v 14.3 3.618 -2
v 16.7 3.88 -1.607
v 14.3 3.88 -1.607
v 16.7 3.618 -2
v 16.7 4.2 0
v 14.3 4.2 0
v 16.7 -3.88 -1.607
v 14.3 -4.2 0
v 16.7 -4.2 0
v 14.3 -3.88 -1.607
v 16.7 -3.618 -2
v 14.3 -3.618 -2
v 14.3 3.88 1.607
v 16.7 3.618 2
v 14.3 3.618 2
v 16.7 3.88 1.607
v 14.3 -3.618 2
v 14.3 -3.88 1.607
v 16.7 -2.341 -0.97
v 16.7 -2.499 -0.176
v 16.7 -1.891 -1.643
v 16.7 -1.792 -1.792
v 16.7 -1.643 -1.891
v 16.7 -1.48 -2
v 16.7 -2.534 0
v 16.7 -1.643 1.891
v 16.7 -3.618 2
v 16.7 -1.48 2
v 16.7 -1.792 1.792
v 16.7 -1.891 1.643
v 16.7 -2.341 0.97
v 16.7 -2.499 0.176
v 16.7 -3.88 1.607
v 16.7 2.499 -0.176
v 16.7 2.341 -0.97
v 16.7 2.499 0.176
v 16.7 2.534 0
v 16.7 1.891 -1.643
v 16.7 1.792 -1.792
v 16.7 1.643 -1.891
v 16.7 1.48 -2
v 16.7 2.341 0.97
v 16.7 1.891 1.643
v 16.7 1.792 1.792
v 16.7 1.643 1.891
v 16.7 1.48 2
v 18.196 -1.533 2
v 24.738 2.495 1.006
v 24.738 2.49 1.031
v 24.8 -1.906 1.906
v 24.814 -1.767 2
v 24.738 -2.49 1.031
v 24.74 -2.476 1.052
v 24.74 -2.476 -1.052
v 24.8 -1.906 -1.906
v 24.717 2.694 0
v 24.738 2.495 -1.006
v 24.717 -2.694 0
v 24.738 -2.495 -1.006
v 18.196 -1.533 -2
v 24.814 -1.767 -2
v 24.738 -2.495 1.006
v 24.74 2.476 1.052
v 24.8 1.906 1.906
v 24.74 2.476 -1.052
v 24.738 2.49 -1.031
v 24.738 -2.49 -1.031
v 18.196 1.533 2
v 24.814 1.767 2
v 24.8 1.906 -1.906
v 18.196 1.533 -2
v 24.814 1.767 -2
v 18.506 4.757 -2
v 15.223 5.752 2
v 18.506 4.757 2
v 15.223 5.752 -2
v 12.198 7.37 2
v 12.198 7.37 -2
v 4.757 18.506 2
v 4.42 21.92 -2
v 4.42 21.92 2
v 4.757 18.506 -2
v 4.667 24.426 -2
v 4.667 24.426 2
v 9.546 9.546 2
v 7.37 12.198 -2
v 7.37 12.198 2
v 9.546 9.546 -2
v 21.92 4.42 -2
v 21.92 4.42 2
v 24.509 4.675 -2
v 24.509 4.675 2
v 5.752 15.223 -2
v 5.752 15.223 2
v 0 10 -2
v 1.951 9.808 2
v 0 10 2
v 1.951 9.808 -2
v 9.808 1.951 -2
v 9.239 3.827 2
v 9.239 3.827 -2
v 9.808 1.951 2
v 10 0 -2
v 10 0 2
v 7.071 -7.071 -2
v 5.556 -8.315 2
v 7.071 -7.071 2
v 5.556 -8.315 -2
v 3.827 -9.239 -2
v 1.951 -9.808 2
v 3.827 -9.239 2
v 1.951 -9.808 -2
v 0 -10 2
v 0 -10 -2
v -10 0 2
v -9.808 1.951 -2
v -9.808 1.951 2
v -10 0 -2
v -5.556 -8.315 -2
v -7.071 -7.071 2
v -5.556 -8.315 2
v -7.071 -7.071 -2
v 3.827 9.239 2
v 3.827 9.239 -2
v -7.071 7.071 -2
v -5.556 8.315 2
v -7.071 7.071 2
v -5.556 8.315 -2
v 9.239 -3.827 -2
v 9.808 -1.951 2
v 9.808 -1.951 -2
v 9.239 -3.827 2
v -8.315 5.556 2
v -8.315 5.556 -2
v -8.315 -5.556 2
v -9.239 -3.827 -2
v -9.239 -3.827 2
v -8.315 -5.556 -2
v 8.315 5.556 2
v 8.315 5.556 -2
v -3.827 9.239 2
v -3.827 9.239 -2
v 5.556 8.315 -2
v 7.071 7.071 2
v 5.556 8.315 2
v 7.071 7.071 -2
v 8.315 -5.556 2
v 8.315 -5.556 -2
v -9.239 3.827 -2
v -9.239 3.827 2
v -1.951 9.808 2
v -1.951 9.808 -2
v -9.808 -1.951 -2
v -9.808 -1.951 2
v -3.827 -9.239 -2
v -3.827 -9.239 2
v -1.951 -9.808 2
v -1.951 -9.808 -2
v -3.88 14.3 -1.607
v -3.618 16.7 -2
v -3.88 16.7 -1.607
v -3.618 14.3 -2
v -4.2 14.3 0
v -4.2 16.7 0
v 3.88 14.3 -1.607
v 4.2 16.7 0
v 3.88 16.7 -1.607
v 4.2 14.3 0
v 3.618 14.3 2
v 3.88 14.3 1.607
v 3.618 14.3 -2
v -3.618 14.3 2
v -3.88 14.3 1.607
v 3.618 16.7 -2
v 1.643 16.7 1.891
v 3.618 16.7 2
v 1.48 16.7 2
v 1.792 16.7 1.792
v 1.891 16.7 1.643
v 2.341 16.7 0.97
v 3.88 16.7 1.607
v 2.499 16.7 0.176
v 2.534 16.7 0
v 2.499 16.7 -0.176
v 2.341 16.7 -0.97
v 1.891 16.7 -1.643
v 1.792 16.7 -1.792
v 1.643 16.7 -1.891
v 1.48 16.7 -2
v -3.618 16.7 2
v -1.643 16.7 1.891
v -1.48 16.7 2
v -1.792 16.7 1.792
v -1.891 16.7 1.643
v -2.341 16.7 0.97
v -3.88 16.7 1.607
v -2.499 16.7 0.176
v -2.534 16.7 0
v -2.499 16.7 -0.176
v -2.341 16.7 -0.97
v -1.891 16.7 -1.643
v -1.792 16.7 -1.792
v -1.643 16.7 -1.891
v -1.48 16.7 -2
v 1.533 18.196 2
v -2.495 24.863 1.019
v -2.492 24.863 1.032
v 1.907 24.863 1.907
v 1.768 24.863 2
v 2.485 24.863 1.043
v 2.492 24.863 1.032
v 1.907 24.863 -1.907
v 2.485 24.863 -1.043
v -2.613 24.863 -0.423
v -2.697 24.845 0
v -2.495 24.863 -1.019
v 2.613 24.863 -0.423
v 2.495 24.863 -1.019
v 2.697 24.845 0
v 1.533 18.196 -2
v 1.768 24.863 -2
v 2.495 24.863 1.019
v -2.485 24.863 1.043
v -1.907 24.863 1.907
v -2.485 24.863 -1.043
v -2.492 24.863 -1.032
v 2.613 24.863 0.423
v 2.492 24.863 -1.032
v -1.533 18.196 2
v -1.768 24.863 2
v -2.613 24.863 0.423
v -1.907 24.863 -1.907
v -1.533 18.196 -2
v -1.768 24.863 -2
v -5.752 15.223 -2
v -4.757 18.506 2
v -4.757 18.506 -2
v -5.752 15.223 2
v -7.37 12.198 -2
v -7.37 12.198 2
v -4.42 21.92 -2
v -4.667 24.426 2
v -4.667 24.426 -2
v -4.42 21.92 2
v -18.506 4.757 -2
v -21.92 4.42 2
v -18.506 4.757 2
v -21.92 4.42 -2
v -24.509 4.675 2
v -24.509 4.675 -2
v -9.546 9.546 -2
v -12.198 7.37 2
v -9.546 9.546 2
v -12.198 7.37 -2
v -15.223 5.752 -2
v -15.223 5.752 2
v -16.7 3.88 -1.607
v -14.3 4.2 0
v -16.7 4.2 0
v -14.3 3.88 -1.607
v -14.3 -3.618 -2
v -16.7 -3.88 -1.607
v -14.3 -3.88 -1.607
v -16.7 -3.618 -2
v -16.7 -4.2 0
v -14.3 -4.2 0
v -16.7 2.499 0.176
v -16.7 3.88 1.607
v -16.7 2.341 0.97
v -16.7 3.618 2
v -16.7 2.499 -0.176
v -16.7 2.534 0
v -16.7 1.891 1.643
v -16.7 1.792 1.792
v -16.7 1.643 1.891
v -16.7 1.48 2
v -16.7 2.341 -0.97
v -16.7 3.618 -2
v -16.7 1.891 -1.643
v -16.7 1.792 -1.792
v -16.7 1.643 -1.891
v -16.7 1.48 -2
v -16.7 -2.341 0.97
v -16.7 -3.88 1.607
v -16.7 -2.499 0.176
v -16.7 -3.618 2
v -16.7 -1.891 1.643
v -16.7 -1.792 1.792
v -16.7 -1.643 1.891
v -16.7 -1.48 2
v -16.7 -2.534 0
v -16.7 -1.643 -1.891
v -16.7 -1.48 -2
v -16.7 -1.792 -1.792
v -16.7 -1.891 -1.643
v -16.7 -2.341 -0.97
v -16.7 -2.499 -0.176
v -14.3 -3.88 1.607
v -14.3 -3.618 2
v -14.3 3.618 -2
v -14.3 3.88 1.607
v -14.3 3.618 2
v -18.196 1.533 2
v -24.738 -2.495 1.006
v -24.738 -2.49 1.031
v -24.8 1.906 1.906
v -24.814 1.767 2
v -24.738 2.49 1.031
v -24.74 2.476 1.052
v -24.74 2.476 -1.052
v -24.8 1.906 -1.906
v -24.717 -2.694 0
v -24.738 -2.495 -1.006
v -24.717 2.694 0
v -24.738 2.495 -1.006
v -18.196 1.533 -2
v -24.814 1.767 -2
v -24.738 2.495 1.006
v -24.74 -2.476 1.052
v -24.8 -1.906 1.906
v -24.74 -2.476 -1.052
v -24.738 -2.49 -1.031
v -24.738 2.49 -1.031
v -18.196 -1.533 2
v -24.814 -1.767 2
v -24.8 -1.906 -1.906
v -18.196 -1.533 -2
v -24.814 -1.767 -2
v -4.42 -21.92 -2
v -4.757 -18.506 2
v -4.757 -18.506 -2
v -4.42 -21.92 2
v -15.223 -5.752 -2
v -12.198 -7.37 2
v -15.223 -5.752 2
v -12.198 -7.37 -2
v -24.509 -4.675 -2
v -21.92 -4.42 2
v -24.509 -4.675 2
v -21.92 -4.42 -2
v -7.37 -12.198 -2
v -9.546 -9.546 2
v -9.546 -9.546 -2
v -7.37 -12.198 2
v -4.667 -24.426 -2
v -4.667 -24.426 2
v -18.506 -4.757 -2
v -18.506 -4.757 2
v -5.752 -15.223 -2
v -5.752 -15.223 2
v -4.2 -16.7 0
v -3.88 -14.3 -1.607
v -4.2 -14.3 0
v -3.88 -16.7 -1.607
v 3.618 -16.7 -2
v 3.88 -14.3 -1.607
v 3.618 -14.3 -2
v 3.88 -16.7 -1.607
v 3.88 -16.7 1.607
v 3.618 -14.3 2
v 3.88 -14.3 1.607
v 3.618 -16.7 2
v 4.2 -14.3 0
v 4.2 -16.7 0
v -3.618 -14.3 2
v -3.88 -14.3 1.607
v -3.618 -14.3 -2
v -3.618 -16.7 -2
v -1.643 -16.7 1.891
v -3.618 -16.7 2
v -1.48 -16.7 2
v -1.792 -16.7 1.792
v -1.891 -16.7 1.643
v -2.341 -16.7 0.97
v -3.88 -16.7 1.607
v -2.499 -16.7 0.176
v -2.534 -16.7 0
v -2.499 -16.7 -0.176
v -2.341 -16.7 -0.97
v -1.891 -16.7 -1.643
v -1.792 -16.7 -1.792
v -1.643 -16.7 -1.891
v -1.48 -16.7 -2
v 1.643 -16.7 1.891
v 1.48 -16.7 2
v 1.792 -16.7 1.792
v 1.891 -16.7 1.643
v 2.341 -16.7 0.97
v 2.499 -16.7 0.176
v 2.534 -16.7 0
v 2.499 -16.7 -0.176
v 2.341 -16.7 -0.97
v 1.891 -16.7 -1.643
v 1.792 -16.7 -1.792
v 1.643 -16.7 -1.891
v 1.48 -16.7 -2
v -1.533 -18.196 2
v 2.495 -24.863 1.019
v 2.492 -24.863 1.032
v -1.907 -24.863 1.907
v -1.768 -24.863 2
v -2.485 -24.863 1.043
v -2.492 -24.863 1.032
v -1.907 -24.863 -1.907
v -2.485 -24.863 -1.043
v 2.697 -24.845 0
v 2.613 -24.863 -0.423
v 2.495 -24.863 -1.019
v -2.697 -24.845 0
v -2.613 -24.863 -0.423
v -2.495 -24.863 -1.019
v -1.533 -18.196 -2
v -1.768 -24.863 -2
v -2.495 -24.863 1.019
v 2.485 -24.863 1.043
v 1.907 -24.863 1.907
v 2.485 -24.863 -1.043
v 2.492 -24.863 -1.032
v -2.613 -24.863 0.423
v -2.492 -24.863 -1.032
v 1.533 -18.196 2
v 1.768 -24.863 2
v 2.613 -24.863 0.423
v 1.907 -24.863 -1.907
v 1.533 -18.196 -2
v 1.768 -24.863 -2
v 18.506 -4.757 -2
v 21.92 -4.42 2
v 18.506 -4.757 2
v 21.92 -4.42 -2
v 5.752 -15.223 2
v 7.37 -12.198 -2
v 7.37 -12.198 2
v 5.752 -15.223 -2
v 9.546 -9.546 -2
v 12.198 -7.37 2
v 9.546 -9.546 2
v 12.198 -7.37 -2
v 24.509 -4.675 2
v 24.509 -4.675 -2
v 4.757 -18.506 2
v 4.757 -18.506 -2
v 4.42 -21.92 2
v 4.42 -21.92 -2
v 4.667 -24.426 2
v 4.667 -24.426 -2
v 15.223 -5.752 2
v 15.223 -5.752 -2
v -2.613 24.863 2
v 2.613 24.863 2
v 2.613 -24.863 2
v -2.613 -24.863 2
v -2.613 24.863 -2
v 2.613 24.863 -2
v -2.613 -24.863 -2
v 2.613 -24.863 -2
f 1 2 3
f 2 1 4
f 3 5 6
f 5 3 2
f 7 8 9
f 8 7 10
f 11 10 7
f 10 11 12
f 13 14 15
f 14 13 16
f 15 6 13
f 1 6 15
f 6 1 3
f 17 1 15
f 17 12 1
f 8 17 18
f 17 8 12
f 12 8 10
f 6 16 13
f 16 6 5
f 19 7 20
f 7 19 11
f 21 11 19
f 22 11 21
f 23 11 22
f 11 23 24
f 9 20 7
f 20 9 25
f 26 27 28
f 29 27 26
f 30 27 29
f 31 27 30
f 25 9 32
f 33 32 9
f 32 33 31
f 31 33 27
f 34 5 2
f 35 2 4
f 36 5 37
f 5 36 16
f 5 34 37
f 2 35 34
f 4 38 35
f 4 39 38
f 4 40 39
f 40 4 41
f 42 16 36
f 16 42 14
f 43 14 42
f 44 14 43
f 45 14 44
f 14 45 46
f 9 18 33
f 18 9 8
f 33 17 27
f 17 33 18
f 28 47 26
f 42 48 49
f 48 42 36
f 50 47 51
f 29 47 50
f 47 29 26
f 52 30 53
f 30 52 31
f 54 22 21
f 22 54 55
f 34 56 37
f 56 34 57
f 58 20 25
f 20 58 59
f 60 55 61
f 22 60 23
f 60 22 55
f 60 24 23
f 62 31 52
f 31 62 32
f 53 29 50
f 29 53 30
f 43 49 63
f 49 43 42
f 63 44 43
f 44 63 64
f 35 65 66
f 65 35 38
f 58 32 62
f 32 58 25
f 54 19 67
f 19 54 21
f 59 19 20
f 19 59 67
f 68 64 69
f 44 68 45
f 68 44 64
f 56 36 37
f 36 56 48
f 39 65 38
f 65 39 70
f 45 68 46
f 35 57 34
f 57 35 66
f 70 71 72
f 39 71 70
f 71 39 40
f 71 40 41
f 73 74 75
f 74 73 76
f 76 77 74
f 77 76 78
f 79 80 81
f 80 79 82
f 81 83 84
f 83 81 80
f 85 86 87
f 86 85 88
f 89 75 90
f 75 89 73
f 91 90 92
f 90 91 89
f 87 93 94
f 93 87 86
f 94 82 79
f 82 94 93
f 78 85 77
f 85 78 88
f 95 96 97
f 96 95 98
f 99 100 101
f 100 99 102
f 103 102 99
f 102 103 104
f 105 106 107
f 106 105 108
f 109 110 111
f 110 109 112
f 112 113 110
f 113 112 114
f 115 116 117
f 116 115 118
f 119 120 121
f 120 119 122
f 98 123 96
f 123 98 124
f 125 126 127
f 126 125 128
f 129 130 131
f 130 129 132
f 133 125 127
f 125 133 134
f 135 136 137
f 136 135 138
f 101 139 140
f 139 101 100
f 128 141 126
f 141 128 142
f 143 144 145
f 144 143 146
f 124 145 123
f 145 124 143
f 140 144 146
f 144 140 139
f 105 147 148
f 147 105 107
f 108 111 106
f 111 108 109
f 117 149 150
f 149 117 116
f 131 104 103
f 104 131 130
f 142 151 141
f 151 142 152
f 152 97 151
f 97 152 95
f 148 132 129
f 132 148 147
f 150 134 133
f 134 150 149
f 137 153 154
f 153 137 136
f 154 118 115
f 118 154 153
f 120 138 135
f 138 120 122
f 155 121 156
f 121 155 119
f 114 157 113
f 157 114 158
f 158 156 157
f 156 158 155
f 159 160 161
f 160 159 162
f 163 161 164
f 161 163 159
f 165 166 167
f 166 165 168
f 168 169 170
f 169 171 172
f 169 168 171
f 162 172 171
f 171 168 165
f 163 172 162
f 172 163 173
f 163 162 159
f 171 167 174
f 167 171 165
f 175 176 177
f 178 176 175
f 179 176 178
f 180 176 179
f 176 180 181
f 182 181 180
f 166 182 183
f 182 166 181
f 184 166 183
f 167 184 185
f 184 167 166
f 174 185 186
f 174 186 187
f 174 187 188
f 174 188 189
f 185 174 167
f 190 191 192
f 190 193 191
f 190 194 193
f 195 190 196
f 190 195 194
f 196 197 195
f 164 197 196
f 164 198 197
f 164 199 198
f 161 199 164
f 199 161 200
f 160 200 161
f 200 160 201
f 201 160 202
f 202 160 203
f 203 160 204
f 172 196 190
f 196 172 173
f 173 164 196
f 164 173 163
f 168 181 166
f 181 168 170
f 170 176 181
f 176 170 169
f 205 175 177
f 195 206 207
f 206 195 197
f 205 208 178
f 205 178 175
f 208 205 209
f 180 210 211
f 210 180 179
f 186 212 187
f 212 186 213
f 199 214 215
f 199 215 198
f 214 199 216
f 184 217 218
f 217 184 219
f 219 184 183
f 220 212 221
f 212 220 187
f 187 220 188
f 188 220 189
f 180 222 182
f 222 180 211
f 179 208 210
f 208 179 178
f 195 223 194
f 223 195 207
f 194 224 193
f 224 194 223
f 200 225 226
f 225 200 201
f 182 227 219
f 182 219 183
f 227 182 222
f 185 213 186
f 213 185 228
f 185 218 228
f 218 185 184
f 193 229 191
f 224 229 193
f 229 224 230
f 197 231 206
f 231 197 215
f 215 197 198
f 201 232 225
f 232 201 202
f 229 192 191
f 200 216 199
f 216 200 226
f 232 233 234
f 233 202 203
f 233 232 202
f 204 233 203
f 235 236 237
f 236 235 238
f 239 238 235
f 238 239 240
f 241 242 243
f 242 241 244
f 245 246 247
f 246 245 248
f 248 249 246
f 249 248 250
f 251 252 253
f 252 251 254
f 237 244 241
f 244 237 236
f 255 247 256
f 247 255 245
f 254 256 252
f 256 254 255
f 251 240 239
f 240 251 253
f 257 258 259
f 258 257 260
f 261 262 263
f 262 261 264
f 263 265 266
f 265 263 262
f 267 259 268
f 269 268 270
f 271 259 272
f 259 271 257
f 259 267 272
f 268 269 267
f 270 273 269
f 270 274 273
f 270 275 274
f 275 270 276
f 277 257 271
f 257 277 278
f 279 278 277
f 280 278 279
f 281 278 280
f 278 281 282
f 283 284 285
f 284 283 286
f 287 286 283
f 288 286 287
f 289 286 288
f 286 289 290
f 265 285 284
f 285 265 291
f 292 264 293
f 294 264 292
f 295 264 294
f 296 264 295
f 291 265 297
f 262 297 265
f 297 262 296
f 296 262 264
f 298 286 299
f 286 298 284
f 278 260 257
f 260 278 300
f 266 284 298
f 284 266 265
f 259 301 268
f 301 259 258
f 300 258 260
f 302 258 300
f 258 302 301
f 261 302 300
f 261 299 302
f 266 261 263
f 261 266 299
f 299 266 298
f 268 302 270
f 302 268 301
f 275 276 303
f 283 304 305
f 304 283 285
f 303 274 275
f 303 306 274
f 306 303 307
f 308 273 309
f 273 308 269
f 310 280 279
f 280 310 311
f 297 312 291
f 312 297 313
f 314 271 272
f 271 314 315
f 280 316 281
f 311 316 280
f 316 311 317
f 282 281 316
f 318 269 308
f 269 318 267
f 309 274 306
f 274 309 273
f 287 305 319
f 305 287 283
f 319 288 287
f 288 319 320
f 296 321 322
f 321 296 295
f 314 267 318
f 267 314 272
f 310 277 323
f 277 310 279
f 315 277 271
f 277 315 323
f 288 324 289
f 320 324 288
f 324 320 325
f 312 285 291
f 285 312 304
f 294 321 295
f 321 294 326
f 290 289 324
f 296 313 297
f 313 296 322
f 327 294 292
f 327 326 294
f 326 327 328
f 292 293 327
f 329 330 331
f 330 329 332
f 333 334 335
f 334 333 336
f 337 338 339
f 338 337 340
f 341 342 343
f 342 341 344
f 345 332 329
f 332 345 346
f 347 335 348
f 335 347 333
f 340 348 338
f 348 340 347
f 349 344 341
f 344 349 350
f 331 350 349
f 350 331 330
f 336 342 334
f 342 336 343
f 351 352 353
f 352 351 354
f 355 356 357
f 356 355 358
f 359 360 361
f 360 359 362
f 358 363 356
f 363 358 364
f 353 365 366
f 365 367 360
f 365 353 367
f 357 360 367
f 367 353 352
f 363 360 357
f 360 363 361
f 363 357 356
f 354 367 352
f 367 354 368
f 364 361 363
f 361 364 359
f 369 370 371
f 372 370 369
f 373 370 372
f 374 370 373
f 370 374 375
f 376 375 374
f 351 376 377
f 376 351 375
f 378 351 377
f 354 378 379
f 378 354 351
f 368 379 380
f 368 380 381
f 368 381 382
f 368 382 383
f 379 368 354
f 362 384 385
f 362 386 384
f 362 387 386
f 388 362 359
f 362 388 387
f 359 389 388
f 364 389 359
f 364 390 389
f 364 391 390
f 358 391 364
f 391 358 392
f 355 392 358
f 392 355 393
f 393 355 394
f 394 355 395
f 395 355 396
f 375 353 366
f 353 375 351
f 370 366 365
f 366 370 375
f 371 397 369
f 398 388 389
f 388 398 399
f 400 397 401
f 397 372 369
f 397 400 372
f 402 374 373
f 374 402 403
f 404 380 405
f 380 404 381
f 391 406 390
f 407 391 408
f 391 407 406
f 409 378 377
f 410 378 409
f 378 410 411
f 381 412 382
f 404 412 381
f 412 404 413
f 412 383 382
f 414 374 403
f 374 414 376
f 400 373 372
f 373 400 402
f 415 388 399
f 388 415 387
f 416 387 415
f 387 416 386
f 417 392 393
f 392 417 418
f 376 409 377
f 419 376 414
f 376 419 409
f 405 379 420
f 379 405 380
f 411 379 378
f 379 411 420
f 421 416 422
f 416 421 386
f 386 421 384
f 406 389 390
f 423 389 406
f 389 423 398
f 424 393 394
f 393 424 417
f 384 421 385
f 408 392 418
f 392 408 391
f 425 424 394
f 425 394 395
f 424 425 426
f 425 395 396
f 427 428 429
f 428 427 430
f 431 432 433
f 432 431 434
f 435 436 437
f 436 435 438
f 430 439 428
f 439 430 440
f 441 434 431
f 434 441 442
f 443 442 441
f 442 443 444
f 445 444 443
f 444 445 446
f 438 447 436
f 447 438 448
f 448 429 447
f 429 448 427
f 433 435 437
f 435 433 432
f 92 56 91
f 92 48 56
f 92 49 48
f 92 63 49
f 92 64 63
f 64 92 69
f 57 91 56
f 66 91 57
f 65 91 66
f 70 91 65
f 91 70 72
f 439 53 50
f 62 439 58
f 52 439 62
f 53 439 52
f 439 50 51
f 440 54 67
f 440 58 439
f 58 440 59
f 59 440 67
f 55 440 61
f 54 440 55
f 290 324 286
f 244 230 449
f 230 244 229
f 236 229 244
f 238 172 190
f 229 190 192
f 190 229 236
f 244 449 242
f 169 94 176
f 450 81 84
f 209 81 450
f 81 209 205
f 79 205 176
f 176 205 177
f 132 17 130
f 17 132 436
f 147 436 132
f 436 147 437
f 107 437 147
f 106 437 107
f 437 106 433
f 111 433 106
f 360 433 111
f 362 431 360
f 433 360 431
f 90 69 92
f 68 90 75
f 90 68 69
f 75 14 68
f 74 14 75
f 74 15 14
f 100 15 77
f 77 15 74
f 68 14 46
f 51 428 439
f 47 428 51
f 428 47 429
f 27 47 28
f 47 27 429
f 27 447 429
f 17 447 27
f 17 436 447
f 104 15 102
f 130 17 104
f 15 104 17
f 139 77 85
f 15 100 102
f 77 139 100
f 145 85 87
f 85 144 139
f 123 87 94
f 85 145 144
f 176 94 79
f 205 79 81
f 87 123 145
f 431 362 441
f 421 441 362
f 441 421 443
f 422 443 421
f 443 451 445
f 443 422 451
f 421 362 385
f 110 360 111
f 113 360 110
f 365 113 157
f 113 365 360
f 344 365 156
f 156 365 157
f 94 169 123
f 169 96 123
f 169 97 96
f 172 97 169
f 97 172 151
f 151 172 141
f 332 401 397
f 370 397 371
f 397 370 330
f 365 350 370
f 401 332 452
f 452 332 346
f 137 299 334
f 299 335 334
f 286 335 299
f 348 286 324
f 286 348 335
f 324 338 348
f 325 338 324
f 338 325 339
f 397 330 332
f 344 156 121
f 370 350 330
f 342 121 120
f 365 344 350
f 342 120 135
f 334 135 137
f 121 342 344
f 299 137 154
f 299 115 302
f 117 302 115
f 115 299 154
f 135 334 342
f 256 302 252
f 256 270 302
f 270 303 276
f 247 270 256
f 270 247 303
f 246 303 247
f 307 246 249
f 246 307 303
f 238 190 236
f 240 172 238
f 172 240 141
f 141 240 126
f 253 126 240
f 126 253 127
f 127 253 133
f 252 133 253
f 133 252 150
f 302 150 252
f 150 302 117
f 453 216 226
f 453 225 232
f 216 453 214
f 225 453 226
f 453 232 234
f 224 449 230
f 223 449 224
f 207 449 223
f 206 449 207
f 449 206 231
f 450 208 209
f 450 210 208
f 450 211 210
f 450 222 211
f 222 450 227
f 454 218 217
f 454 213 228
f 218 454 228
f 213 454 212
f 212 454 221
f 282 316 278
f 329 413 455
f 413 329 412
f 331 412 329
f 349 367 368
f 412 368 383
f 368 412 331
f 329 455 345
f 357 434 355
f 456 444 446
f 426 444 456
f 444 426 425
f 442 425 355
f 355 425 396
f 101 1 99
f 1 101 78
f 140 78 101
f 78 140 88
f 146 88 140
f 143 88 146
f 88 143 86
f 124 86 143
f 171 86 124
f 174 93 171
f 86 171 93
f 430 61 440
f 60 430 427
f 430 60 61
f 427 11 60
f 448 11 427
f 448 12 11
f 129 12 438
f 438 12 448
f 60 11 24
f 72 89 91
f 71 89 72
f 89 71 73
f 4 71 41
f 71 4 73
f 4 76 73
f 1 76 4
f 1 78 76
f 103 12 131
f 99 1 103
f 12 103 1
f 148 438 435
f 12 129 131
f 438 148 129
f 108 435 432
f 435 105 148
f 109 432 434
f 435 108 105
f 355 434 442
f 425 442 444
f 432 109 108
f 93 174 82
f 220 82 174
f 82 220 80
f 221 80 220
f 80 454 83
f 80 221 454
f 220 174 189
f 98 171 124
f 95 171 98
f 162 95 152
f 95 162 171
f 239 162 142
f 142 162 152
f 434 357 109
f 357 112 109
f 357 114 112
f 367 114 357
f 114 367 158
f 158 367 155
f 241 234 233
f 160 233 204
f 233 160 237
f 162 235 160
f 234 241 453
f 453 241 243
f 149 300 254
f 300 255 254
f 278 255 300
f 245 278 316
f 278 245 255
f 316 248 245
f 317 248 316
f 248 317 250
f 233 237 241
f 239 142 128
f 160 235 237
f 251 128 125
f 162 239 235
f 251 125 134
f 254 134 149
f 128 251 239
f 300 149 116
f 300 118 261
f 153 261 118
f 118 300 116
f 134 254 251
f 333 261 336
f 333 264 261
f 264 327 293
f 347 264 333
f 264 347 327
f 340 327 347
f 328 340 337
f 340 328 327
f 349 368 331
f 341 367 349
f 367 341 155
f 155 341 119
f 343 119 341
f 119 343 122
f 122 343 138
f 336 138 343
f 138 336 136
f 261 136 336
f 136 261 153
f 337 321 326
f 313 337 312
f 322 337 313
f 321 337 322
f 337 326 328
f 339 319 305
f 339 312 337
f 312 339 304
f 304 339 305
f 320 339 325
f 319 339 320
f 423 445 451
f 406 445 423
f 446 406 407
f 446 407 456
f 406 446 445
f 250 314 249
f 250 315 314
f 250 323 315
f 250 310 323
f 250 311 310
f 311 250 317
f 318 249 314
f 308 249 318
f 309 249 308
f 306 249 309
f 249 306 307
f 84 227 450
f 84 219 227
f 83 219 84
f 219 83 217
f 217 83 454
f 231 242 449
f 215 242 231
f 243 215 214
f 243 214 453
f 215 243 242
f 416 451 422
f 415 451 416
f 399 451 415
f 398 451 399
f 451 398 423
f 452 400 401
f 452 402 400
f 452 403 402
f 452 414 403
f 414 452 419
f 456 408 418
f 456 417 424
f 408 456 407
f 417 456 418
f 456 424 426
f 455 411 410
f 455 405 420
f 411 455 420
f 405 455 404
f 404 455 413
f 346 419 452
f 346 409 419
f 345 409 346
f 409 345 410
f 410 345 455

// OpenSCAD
//thickness of the shuriken (4mm works well)
shuriken_w = 4;
//Number of points
shuriken_points = 4;
//Shuriken diameter (without pins)
shuriken_dia = 50;
//Diameter of the middle hole
middle_hole_dia = 20;
tolerance = 0.2;
module shuriken()
{
    difference()
    {
        cylinder(r=shuriken_dia/2, h= shuriken_w, center=true);
        for(x=[0:shuriken_points -1])
        {
           
            rotate([0,90,360/shuriken_points*x])
             translate([0,0,shuriken_dia/2 - 9.5])
            cylinder(r=4+tolerance, h=2+tolerance*2, center=true, $fn=16);
            rotate([0,90,360/shuriken_points*x])
             translate([0,0,shuriken_dia/2 -5])
            cylinder(r1= 2.3+tolerance, r2=2.5+tolerance, h=10, center=true, $fn=16);
            rotate([0,0,360/shuriken_points * (x + 0.5)])
             translate([shuriken_dia*0.62,0,0])
            cylinder(r=shuriken_dia/shuriken_points + 5, h=10, center=true,$fn= 32);
            cylinder(r=middle_hole_dia/2,h=10,center=true,$fn= 32);
        }
    }
}
shuriken();
